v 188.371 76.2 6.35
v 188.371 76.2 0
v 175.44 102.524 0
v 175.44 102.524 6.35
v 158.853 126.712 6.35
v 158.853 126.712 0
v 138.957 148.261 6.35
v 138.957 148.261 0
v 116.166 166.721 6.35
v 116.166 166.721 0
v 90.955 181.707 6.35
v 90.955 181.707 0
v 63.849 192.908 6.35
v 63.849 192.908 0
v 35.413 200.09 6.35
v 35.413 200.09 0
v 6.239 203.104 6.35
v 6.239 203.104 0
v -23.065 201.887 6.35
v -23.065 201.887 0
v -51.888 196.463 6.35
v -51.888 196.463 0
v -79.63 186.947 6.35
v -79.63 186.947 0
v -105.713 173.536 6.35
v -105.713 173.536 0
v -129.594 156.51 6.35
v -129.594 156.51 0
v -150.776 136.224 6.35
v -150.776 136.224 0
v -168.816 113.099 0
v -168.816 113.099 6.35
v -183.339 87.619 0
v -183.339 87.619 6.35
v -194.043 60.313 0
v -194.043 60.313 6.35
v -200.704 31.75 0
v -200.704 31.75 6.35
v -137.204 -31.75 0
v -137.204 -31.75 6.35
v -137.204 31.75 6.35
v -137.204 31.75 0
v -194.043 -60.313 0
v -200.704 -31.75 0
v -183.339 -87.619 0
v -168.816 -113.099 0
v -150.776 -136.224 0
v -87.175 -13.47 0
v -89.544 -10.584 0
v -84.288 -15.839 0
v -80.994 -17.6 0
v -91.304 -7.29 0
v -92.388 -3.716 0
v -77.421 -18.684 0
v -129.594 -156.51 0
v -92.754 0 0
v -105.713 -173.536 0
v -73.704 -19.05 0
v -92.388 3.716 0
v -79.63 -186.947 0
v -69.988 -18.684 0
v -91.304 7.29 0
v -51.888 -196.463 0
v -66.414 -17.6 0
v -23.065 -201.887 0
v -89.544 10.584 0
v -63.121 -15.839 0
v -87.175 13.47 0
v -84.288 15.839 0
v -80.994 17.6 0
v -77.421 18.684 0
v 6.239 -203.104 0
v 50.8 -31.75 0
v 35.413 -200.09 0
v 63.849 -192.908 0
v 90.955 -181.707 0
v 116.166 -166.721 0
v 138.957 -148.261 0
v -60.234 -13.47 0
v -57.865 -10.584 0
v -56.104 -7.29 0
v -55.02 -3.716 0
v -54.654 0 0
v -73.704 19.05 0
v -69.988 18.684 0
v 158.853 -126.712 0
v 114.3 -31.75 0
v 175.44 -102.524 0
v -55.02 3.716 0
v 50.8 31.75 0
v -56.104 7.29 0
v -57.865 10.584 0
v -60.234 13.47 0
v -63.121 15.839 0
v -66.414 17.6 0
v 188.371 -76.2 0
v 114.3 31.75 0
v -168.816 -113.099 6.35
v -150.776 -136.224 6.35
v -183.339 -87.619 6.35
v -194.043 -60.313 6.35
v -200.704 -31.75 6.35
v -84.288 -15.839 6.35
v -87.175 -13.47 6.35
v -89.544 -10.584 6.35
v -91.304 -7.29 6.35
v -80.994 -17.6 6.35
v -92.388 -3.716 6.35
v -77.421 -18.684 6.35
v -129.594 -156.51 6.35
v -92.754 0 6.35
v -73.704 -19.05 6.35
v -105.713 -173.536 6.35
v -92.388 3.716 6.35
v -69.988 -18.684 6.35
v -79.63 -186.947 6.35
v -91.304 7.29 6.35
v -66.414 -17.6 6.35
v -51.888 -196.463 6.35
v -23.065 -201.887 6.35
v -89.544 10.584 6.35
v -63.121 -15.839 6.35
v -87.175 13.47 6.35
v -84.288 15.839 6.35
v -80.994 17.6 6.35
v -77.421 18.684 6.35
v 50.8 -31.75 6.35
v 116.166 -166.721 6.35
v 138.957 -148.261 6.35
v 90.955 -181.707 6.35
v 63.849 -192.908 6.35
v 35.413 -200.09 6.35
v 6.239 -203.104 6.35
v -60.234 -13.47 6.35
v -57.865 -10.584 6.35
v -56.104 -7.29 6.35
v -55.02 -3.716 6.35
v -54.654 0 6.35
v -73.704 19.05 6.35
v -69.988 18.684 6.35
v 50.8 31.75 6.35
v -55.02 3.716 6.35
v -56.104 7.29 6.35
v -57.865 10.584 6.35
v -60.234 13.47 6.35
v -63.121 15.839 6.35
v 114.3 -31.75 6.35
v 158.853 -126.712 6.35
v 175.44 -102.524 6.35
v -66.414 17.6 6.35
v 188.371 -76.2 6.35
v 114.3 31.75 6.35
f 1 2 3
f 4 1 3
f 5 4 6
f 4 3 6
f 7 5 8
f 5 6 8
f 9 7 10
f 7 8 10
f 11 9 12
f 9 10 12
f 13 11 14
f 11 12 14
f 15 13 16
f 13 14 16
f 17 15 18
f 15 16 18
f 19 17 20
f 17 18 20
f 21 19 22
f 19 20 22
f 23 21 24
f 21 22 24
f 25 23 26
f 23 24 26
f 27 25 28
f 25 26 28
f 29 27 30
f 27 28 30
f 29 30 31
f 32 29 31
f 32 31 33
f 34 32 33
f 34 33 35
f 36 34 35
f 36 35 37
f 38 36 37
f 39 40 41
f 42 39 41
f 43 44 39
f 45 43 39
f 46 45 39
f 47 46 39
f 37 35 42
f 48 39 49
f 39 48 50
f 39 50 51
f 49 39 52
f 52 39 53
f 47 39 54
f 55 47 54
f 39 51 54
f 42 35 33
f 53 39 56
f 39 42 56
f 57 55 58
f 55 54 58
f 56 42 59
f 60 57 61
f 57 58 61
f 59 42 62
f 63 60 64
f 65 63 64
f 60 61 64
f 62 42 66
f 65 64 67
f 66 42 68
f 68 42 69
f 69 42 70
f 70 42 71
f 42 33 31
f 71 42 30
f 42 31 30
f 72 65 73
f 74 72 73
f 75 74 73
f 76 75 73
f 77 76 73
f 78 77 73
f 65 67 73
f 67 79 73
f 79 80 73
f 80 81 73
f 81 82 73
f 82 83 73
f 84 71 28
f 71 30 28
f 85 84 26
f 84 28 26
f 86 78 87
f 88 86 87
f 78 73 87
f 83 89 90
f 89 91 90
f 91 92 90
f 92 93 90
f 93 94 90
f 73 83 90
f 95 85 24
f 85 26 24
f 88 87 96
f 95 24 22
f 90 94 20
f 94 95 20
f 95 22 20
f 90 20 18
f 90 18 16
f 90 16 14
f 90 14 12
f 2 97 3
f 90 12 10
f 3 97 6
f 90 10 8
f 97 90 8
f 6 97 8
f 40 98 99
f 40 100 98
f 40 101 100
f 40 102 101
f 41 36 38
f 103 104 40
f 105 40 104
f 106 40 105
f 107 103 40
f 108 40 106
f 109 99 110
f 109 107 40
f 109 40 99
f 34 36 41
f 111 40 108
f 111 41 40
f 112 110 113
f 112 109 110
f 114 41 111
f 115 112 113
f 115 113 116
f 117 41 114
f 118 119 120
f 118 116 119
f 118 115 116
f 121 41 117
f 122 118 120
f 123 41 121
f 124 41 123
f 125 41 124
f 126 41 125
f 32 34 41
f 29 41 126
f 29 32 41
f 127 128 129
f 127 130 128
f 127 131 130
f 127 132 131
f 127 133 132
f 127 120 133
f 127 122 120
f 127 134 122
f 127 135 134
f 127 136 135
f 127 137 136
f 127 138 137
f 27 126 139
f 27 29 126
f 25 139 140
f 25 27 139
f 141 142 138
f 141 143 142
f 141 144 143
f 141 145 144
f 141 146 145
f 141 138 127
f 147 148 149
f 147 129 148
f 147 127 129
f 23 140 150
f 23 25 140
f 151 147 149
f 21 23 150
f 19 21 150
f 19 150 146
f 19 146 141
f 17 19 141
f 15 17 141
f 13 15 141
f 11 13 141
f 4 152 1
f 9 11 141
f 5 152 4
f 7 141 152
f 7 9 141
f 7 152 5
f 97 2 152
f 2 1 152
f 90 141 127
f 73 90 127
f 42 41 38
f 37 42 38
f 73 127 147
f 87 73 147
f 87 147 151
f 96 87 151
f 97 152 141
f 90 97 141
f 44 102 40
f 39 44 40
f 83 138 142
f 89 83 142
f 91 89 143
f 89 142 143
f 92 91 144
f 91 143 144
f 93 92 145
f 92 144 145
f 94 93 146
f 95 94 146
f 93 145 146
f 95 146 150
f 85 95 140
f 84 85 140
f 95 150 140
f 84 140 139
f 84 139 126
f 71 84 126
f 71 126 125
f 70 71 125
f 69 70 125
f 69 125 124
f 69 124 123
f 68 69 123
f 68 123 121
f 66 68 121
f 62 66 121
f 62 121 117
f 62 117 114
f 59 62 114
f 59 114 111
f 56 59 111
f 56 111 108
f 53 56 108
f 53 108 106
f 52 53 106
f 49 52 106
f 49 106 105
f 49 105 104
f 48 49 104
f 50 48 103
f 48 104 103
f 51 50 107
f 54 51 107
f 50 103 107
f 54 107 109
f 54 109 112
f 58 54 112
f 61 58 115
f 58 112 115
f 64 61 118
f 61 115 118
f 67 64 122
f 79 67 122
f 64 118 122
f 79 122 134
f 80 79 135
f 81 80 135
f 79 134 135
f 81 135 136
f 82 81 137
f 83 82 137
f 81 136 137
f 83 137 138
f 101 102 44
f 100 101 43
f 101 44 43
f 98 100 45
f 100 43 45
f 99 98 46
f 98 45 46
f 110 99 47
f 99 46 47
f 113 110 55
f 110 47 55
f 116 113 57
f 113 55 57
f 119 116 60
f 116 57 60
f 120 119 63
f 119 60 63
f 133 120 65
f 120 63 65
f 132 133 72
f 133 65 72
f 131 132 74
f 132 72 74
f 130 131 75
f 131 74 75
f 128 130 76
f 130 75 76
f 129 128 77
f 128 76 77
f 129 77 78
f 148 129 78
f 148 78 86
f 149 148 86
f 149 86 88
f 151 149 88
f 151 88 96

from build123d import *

# Parameters (mm, degrees)
F0_R     = 203.2
F1_DEPTH = 6.35
F3_DEPTH = 6.351
F5_DEPTH = 6.351
F6_R     = 19.05
F7_DEPTH = 6.351


with BuildPart() as f1:
    # F0 (on Top) → F1 (new body)
    with BuildSketch(Plane.XY):
        Circle(F0_R)
    extrude(amount=F1_DEPTH)

    # F2 (on face) → F3 (cut, through all)
    with BuildSketch(Plane.XY.offset(6.35)):
        with BuildLine():
            ThreePointArc((-200.704204, 31.75), (-203.2, 0), (-200.704204, -31.75))
            Line((-200.704204, -31.75), (-137.204204, -31.75))
            Line((-137.204204, -31.75), (-137.204204, 31.75))
            Line((-137.204204, 31.75), (-200.704204, 31.75))
        make_face()
    extrude(amount=-F3_DEPTH, mode=Mode.SUBTRACT)

    # F4 (on face) → F5 (cut, through all)
    with BuildSketch(Plane.XY.offset(6.35)):
        Polygon((50.8, 31.75), (50.8, -31.75), (114.3, -31.75), (188.371442, -76.2), (188.371442, 76.2), (114.3, 31.75), align=None)
        with BuildLine():
            Line((188.371442, 76.2), (188.371442, -76.2))
            ThreePointArc((188.371442, -76.2), (203.2, 0), (188.371442, 76.2))
        make_face()
    extrude(amount=-F5_DEPTH, mode=Mode.SUBTRACT)

    # F6 (on face) → F7 (cut, through all)
    with BuildSketch(Plane.XY.offset(6.35)):
        with Locations((-73.704204, 0)):
            Circle(F6_R)
    extrude(amount=-F7_DEPTH, mode=Mode.SUBTRACT)


solid = f1.part
